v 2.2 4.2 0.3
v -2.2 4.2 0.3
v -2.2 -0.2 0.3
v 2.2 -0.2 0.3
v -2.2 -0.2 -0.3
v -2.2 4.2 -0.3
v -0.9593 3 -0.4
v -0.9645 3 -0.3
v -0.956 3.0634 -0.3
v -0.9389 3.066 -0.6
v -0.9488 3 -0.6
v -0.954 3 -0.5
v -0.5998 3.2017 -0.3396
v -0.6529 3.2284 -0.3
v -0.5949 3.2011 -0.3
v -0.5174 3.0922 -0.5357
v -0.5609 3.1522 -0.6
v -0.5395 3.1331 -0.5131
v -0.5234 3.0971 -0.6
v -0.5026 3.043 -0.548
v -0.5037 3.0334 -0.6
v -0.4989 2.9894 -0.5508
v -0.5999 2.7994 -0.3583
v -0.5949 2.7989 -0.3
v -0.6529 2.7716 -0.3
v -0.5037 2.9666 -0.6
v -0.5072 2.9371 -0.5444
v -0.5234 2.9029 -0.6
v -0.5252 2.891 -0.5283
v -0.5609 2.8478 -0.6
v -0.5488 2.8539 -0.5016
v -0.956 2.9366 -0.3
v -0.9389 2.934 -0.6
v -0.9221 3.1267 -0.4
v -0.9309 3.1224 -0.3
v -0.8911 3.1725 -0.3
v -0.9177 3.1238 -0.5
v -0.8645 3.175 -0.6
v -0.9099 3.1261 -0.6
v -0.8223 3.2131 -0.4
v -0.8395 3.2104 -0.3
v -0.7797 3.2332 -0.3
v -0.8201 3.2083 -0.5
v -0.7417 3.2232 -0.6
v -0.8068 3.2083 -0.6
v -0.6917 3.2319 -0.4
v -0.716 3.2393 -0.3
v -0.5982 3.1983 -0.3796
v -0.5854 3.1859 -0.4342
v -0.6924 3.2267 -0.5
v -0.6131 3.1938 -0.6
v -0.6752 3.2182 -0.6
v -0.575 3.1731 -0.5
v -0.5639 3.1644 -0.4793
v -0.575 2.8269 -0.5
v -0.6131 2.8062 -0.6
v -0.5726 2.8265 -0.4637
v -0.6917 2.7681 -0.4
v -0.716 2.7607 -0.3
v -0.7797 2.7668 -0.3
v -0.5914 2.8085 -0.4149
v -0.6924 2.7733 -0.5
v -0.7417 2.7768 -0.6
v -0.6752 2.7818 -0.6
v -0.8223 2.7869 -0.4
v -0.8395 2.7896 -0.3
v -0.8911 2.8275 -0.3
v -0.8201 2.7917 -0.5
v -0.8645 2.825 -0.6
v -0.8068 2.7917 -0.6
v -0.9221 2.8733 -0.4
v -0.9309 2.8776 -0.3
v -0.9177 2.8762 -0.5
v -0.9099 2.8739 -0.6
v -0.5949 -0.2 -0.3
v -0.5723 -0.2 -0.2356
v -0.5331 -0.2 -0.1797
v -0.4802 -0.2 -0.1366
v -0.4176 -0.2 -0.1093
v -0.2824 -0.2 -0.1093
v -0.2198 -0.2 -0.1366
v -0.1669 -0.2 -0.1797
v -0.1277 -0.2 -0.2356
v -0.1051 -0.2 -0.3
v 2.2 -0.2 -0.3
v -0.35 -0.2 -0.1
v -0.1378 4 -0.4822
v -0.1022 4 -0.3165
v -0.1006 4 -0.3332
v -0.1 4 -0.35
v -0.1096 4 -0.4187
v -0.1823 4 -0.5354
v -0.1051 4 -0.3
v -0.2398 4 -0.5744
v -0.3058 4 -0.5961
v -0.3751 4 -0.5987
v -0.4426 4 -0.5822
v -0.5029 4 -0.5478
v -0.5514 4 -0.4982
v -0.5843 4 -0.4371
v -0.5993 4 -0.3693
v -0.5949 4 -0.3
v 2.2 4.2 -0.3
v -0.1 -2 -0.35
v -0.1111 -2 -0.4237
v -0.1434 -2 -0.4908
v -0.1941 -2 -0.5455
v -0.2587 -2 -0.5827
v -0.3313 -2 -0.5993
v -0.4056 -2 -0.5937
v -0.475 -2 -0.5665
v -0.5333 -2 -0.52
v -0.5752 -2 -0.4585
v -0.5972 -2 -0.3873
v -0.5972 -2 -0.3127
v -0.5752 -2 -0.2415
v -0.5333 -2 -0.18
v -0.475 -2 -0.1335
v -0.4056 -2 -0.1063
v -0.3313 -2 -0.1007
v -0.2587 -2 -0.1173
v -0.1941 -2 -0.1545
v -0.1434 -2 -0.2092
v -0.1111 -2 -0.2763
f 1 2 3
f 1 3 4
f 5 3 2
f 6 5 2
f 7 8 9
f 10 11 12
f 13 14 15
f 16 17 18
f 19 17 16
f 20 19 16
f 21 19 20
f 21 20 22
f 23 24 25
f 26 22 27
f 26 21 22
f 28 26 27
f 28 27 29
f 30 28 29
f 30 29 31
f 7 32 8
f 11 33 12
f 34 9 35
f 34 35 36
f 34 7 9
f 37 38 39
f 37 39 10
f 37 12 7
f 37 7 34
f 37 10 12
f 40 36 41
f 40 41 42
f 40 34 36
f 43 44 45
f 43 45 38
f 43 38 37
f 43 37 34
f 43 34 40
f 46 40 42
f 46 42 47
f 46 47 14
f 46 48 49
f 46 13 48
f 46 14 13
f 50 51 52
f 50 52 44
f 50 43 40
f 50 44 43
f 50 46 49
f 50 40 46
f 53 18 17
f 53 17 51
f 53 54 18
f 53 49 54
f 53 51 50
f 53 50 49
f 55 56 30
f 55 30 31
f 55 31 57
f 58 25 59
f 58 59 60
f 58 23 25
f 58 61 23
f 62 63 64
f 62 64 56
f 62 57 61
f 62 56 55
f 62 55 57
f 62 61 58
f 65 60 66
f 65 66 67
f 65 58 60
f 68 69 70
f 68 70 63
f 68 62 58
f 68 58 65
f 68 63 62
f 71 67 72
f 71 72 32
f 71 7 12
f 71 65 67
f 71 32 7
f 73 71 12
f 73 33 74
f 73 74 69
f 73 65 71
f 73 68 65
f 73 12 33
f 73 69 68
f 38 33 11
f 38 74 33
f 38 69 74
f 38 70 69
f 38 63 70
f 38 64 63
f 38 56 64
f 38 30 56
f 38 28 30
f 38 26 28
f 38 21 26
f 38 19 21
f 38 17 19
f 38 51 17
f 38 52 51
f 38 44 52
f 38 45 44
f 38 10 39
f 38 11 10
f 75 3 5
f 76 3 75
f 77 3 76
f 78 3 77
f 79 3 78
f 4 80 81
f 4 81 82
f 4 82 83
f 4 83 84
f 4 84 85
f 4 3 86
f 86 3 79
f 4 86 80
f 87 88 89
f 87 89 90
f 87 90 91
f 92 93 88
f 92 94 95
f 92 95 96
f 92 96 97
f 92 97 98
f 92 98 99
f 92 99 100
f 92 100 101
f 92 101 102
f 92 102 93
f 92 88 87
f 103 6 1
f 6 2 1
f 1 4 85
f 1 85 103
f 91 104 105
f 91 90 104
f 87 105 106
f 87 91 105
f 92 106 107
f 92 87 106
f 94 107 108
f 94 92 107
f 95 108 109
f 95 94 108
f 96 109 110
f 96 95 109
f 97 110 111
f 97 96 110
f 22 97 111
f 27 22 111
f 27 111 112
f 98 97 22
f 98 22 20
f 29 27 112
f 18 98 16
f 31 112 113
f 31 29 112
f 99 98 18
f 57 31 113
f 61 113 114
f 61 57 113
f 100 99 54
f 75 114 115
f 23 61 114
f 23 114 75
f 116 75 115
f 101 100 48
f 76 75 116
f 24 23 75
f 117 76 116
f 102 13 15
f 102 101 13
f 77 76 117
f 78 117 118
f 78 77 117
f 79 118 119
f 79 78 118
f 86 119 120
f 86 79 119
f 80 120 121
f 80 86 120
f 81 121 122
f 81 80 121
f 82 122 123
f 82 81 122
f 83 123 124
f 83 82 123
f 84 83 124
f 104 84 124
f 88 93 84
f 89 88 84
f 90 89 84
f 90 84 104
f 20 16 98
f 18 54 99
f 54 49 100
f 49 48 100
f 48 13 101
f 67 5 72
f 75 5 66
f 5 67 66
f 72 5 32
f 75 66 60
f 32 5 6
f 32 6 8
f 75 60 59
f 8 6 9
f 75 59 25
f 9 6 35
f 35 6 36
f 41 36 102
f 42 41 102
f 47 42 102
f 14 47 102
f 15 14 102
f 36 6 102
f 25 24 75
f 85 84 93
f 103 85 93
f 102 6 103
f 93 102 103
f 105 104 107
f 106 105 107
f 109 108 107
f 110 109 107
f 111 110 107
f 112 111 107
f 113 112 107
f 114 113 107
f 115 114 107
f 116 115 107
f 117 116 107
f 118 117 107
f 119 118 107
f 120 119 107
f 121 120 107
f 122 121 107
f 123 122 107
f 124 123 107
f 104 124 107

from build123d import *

# Parameters (mm, degrees)
SKETCH1_W                = 4
SKETCH1_H                = 4
BOSS_EXTRUDE1_DEPTH      = 0.1
SKETCH2_R                = 0.25
BOSS_EXTRUDE2_DEPTH      = 4
BOSS_EXTRUDE2_DEPTH_BACK = 2
SKETCH3_R                = 0.25
BOSS_EXTRUDE3_DEPTH      = 0.5
BOSS_EXTRUDE3_TAPER      = 3
SKETCH4_W                = 4.4
SKETCH4_H                = 4.4
BOSS_EXTRUDE4_DEPTH      = 0.3


with BuildPart() as part:
    # Sketch1 → Boss-Extrude1 (new body, symmetric)
    with BuildSketch(Plane.XY):
        with Locations((0, 2)):
            Rectangle(SKETCH1_W, SKETCH1_H)
    extrude(amount=BOSS_EXTRUDE1_DEPTH, both=True)

    # Sketch3 → Boss-Extrude3 (add)
    with BuildSketch(Plane(origin=(0, 0, -0.1), x_dir=(-1, 0, 0), z_dir=(0, 0, -1))):
        with Locations((0.725, 3)):
            Circle(SKETCH3_R)
    extrude(amount=BOSS_EXTRUDE3_DEPTH, taper=BOSS_EXTRUDE3_TAPER)



with BuildPart() as body_2:
    # Sketch2 → Boss-Extrude2 (new body, two sides)
    with BuildSketch(Plane(origin=(0, 0, 0), x_dir=(1, 0, 0), z_dir=(0, 1, 0))) as boss_extrude2_sk:
        with Locations((-0.35, 0.35)):
            Circle(SKETCH2_R)
    extrude(amount=BOSS_EXTRUDE2_DEPTH)
    extrude(boss_extrude2_sk.sketch, amount=-BOSS_EXTRUDE2_DEPTH_BACK)


with BuildPart() as part_1:
    add(part.part)

    add(body_2.part)  # Boss-Extrude4 merges body 2
    # Sketch4 → Boss-Extrude4 (add, symmetric)
    with BuildSketch(Plane.XY):
        with Locations((0, 2)):
            Rectangle(SKETCH4_W, SKETCH4_H)
    extrude(amount=BOSS_EXTRUDE4_DEPTH, both=True)


solid = part_1.part
